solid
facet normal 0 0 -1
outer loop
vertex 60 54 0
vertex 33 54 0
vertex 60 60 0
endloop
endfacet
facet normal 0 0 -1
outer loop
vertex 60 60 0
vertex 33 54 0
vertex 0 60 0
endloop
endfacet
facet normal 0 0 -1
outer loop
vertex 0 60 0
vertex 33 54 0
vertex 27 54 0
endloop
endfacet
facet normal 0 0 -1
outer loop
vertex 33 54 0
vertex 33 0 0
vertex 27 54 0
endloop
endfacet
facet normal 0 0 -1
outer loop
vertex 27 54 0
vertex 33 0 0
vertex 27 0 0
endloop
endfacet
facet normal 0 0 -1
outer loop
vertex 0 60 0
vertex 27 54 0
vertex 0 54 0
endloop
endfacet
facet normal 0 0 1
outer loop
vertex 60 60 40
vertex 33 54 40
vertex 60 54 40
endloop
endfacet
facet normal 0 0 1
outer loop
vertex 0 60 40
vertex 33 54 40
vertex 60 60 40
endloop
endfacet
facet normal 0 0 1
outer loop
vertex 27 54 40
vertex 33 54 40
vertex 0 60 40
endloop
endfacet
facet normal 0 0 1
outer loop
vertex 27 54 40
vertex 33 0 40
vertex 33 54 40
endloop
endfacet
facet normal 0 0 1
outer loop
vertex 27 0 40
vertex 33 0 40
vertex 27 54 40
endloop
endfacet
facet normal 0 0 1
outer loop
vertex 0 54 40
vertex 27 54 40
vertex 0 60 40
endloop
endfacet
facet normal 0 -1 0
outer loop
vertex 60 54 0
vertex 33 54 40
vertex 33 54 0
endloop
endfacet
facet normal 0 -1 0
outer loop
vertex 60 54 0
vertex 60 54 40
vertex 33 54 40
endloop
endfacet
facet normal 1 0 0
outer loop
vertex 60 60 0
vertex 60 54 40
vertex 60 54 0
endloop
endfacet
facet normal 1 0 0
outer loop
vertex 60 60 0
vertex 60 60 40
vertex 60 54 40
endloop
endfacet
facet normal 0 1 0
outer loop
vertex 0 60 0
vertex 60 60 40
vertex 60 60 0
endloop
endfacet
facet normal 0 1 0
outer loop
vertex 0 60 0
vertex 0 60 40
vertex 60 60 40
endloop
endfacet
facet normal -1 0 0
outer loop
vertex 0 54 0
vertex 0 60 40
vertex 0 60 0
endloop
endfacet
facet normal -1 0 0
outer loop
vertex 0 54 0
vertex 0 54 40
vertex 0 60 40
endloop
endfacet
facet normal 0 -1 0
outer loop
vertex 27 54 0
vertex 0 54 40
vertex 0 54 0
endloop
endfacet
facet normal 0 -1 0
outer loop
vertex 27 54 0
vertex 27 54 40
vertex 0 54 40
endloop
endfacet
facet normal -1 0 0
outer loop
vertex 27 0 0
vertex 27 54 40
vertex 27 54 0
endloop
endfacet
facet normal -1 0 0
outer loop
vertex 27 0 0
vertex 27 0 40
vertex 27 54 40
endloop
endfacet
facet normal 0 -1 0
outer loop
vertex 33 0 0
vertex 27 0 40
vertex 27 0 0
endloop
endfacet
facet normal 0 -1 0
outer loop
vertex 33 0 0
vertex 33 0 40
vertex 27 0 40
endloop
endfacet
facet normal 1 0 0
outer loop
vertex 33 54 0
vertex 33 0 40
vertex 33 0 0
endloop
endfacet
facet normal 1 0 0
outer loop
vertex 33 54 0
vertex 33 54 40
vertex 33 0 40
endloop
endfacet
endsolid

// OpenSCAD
$fn = 32;

// ----------------------------------------------------------------------
// Structural section: tee 60 x 60 mm
// ----------------------------------------------------------------------

// --- parameters (mm) ---
sec_w = 60;               // tee width, X
sec_h = 60;               // tee height, Y
flange_t = 6;             // top flange thickness
web_t = 6;                // web thickness
plate_t = 40;             // cut length, Z (extrusion height)

profile = [[27, 0], [33, 0], [33, 54], [60, 54], [60, 60], [0, 60], [0, 54], [27, 54]];  // primary outline, 8 points, counter clockwise

// --- the one profile operation ---
linear_extrude(height = plate_t) polygon(points = profile);
